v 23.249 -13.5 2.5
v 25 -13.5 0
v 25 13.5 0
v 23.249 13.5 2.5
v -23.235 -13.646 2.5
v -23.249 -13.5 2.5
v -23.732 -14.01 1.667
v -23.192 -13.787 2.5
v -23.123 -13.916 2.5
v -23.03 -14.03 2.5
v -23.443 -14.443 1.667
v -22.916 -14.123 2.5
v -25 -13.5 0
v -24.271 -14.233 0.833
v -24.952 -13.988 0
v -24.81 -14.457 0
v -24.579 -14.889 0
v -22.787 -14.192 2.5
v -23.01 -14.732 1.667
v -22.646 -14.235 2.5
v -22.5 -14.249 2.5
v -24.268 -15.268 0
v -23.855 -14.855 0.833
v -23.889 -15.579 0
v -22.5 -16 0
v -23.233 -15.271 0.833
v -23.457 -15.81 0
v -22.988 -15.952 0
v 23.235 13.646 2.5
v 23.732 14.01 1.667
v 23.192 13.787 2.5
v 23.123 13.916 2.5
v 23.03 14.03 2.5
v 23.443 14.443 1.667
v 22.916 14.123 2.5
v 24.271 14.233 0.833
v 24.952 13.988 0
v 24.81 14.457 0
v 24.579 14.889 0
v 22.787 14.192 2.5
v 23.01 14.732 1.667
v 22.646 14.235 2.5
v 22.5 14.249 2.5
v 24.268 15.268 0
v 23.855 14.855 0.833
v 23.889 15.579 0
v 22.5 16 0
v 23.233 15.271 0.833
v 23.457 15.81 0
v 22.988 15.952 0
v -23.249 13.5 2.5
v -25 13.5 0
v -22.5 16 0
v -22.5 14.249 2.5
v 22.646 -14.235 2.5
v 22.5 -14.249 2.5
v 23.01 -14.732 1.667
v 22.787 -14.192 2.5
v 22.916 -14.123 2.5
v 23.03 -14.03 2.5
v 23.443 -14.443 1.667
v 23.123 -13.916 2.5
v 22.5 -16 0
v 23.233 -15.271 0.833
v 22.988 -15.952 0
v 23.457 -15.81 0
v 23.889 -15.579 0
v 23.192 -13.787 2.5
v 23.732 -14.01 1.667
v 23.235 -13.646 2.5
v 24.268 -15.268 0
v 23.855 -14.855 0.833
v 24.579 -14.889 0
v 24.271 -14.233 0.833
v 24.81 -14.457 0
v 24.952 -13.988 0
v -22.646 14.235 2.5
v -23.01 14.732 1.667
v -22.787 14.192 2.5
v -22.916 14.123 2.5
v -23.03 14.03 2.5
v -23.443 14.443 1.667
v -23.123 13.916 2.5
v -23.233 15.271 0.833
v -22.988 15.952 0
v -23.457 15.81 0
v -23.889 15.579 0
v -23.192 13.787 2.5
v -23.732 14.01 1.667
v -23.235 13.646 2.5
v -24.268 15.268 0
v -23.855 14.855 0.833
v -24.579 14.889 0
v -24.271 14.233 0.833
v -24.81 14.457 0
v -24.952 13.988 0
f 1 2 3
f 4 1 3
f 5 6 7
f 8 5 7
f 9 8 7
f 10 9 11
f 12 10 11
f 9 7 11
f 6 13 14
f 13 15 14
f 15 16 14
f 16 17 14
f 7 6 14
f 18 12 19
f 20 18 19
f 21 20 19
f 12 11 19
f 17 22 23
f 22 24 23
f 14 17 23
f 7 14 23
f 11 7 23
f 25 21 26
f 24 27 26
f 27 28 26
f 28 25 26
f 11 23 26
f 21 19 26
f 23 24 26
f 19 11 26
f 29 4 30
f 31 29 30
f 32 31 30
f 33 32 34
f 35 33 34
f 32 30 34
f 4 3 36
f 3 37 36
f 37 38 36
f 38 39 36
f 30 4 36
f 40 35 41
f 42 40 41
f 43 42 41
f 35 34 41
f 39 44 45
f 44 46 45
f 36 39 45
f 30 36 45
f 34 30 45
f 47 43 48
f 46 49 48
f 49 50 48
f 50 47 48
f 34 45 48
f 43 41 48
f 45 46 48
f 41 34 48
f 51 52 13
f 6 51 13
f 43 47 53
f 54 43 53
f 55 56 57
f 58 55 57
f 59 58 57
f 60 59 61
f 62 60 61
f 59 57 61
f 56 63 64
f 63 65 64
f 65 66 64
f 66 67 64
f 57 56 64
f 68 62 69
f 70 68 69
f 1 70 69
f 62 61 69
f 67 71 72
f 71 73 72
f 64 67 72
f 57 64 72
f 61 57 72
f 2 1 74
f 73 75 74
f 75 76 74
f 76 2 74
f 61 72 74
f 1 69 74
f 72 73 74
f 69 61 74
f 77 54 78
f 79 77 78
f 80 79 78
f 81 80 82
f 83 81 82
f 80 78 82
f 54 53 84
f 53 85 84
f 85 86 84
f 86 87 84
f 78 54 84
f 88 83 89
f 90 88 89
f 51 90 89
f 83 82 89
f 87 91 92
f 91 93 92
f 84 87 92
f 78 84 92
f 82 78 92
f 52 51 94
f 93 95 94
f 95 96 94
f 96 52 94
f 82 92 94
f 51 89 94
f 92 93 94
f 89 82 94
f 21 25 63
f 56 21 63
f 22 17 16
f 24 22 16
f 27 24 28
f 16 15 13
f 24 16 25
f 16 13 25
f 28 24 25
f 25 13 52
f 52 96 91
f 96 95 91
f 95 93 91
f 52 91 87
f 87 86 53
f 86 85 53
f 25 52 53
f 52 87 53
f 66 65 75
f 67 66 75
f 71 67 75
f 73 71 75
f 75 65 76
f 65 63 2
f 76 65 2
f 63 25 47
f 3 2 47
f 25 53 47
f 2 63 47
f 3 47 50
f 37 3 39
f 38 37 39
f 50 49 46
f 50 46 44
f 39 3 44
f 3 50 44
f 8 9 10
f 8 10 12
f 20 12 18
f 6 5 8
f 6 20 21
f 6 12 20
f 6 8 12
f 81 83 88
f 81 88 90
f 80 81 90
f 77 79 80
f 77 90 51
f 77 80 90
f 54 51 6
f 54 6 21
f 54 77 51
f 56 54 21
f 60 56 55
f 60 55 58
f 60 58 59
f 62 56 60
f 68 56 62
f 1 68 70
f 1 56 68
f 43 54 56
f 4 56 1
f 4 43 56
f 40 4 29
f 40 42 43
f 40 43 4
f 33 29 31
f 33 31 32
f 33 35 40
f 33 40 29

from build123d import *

# Parameters (mm, degrees)
F0_W     = 50
F0_H     = 32
F1_DEPTH = 2.5
F2_R     = 2.5
F3_SIZE2 = 2.49999
F3_SIZE  = 1.750509


# Not quite as in the source:
# - a fillet or chamfer is up to 0.001 mm smaller than in the source, because OpenCascade refuses the exact size


with BuildPart() as f1:
    # F0 (on Top) → F1 (new body)
    with BuildSketch(Plane.XY):
        Rectangle(F0_W, F0_H)
    extrude(amount=F1_DEPTH)

    # F2
    f2_edges = [f1.edges().sort_by_distance(p)[0] for p in [
        (-25, -16, 1.25),
        (25, -16, 1.25),
        (25, 16, 1.25),
        (-25, 16, 1.25),
    ]]
    fillet(f2_edges, radius=F2_R)

    # F3 (size 1.7505188455 and 2.5 in the source; OpenCascade refuses exactly that, so slightly less here)
    f3_edges = [f1.edges().sort_by_distance(p)[0] for p in [
        (0, -16, 2.5),
        (-24.267767, -15.267767, 2.5),
        (-25, 0, 2.5),
        (-24.267767, 15.267767, 2.5),
        (0, 16, 2.5),
        (24.267767, 15.267767, 2.5),
        (25, 0, 2.5),
        (24.267767, -15.267767, 2.5),
    ]]
    f3_side = f1.faces().sort_by_distance((0, 0, 2.5))[0]
    chamfer(f3_edges, length=F3_SIZE, length2=F3_SIZE2, reference=f3_side)


solid = f1.part
